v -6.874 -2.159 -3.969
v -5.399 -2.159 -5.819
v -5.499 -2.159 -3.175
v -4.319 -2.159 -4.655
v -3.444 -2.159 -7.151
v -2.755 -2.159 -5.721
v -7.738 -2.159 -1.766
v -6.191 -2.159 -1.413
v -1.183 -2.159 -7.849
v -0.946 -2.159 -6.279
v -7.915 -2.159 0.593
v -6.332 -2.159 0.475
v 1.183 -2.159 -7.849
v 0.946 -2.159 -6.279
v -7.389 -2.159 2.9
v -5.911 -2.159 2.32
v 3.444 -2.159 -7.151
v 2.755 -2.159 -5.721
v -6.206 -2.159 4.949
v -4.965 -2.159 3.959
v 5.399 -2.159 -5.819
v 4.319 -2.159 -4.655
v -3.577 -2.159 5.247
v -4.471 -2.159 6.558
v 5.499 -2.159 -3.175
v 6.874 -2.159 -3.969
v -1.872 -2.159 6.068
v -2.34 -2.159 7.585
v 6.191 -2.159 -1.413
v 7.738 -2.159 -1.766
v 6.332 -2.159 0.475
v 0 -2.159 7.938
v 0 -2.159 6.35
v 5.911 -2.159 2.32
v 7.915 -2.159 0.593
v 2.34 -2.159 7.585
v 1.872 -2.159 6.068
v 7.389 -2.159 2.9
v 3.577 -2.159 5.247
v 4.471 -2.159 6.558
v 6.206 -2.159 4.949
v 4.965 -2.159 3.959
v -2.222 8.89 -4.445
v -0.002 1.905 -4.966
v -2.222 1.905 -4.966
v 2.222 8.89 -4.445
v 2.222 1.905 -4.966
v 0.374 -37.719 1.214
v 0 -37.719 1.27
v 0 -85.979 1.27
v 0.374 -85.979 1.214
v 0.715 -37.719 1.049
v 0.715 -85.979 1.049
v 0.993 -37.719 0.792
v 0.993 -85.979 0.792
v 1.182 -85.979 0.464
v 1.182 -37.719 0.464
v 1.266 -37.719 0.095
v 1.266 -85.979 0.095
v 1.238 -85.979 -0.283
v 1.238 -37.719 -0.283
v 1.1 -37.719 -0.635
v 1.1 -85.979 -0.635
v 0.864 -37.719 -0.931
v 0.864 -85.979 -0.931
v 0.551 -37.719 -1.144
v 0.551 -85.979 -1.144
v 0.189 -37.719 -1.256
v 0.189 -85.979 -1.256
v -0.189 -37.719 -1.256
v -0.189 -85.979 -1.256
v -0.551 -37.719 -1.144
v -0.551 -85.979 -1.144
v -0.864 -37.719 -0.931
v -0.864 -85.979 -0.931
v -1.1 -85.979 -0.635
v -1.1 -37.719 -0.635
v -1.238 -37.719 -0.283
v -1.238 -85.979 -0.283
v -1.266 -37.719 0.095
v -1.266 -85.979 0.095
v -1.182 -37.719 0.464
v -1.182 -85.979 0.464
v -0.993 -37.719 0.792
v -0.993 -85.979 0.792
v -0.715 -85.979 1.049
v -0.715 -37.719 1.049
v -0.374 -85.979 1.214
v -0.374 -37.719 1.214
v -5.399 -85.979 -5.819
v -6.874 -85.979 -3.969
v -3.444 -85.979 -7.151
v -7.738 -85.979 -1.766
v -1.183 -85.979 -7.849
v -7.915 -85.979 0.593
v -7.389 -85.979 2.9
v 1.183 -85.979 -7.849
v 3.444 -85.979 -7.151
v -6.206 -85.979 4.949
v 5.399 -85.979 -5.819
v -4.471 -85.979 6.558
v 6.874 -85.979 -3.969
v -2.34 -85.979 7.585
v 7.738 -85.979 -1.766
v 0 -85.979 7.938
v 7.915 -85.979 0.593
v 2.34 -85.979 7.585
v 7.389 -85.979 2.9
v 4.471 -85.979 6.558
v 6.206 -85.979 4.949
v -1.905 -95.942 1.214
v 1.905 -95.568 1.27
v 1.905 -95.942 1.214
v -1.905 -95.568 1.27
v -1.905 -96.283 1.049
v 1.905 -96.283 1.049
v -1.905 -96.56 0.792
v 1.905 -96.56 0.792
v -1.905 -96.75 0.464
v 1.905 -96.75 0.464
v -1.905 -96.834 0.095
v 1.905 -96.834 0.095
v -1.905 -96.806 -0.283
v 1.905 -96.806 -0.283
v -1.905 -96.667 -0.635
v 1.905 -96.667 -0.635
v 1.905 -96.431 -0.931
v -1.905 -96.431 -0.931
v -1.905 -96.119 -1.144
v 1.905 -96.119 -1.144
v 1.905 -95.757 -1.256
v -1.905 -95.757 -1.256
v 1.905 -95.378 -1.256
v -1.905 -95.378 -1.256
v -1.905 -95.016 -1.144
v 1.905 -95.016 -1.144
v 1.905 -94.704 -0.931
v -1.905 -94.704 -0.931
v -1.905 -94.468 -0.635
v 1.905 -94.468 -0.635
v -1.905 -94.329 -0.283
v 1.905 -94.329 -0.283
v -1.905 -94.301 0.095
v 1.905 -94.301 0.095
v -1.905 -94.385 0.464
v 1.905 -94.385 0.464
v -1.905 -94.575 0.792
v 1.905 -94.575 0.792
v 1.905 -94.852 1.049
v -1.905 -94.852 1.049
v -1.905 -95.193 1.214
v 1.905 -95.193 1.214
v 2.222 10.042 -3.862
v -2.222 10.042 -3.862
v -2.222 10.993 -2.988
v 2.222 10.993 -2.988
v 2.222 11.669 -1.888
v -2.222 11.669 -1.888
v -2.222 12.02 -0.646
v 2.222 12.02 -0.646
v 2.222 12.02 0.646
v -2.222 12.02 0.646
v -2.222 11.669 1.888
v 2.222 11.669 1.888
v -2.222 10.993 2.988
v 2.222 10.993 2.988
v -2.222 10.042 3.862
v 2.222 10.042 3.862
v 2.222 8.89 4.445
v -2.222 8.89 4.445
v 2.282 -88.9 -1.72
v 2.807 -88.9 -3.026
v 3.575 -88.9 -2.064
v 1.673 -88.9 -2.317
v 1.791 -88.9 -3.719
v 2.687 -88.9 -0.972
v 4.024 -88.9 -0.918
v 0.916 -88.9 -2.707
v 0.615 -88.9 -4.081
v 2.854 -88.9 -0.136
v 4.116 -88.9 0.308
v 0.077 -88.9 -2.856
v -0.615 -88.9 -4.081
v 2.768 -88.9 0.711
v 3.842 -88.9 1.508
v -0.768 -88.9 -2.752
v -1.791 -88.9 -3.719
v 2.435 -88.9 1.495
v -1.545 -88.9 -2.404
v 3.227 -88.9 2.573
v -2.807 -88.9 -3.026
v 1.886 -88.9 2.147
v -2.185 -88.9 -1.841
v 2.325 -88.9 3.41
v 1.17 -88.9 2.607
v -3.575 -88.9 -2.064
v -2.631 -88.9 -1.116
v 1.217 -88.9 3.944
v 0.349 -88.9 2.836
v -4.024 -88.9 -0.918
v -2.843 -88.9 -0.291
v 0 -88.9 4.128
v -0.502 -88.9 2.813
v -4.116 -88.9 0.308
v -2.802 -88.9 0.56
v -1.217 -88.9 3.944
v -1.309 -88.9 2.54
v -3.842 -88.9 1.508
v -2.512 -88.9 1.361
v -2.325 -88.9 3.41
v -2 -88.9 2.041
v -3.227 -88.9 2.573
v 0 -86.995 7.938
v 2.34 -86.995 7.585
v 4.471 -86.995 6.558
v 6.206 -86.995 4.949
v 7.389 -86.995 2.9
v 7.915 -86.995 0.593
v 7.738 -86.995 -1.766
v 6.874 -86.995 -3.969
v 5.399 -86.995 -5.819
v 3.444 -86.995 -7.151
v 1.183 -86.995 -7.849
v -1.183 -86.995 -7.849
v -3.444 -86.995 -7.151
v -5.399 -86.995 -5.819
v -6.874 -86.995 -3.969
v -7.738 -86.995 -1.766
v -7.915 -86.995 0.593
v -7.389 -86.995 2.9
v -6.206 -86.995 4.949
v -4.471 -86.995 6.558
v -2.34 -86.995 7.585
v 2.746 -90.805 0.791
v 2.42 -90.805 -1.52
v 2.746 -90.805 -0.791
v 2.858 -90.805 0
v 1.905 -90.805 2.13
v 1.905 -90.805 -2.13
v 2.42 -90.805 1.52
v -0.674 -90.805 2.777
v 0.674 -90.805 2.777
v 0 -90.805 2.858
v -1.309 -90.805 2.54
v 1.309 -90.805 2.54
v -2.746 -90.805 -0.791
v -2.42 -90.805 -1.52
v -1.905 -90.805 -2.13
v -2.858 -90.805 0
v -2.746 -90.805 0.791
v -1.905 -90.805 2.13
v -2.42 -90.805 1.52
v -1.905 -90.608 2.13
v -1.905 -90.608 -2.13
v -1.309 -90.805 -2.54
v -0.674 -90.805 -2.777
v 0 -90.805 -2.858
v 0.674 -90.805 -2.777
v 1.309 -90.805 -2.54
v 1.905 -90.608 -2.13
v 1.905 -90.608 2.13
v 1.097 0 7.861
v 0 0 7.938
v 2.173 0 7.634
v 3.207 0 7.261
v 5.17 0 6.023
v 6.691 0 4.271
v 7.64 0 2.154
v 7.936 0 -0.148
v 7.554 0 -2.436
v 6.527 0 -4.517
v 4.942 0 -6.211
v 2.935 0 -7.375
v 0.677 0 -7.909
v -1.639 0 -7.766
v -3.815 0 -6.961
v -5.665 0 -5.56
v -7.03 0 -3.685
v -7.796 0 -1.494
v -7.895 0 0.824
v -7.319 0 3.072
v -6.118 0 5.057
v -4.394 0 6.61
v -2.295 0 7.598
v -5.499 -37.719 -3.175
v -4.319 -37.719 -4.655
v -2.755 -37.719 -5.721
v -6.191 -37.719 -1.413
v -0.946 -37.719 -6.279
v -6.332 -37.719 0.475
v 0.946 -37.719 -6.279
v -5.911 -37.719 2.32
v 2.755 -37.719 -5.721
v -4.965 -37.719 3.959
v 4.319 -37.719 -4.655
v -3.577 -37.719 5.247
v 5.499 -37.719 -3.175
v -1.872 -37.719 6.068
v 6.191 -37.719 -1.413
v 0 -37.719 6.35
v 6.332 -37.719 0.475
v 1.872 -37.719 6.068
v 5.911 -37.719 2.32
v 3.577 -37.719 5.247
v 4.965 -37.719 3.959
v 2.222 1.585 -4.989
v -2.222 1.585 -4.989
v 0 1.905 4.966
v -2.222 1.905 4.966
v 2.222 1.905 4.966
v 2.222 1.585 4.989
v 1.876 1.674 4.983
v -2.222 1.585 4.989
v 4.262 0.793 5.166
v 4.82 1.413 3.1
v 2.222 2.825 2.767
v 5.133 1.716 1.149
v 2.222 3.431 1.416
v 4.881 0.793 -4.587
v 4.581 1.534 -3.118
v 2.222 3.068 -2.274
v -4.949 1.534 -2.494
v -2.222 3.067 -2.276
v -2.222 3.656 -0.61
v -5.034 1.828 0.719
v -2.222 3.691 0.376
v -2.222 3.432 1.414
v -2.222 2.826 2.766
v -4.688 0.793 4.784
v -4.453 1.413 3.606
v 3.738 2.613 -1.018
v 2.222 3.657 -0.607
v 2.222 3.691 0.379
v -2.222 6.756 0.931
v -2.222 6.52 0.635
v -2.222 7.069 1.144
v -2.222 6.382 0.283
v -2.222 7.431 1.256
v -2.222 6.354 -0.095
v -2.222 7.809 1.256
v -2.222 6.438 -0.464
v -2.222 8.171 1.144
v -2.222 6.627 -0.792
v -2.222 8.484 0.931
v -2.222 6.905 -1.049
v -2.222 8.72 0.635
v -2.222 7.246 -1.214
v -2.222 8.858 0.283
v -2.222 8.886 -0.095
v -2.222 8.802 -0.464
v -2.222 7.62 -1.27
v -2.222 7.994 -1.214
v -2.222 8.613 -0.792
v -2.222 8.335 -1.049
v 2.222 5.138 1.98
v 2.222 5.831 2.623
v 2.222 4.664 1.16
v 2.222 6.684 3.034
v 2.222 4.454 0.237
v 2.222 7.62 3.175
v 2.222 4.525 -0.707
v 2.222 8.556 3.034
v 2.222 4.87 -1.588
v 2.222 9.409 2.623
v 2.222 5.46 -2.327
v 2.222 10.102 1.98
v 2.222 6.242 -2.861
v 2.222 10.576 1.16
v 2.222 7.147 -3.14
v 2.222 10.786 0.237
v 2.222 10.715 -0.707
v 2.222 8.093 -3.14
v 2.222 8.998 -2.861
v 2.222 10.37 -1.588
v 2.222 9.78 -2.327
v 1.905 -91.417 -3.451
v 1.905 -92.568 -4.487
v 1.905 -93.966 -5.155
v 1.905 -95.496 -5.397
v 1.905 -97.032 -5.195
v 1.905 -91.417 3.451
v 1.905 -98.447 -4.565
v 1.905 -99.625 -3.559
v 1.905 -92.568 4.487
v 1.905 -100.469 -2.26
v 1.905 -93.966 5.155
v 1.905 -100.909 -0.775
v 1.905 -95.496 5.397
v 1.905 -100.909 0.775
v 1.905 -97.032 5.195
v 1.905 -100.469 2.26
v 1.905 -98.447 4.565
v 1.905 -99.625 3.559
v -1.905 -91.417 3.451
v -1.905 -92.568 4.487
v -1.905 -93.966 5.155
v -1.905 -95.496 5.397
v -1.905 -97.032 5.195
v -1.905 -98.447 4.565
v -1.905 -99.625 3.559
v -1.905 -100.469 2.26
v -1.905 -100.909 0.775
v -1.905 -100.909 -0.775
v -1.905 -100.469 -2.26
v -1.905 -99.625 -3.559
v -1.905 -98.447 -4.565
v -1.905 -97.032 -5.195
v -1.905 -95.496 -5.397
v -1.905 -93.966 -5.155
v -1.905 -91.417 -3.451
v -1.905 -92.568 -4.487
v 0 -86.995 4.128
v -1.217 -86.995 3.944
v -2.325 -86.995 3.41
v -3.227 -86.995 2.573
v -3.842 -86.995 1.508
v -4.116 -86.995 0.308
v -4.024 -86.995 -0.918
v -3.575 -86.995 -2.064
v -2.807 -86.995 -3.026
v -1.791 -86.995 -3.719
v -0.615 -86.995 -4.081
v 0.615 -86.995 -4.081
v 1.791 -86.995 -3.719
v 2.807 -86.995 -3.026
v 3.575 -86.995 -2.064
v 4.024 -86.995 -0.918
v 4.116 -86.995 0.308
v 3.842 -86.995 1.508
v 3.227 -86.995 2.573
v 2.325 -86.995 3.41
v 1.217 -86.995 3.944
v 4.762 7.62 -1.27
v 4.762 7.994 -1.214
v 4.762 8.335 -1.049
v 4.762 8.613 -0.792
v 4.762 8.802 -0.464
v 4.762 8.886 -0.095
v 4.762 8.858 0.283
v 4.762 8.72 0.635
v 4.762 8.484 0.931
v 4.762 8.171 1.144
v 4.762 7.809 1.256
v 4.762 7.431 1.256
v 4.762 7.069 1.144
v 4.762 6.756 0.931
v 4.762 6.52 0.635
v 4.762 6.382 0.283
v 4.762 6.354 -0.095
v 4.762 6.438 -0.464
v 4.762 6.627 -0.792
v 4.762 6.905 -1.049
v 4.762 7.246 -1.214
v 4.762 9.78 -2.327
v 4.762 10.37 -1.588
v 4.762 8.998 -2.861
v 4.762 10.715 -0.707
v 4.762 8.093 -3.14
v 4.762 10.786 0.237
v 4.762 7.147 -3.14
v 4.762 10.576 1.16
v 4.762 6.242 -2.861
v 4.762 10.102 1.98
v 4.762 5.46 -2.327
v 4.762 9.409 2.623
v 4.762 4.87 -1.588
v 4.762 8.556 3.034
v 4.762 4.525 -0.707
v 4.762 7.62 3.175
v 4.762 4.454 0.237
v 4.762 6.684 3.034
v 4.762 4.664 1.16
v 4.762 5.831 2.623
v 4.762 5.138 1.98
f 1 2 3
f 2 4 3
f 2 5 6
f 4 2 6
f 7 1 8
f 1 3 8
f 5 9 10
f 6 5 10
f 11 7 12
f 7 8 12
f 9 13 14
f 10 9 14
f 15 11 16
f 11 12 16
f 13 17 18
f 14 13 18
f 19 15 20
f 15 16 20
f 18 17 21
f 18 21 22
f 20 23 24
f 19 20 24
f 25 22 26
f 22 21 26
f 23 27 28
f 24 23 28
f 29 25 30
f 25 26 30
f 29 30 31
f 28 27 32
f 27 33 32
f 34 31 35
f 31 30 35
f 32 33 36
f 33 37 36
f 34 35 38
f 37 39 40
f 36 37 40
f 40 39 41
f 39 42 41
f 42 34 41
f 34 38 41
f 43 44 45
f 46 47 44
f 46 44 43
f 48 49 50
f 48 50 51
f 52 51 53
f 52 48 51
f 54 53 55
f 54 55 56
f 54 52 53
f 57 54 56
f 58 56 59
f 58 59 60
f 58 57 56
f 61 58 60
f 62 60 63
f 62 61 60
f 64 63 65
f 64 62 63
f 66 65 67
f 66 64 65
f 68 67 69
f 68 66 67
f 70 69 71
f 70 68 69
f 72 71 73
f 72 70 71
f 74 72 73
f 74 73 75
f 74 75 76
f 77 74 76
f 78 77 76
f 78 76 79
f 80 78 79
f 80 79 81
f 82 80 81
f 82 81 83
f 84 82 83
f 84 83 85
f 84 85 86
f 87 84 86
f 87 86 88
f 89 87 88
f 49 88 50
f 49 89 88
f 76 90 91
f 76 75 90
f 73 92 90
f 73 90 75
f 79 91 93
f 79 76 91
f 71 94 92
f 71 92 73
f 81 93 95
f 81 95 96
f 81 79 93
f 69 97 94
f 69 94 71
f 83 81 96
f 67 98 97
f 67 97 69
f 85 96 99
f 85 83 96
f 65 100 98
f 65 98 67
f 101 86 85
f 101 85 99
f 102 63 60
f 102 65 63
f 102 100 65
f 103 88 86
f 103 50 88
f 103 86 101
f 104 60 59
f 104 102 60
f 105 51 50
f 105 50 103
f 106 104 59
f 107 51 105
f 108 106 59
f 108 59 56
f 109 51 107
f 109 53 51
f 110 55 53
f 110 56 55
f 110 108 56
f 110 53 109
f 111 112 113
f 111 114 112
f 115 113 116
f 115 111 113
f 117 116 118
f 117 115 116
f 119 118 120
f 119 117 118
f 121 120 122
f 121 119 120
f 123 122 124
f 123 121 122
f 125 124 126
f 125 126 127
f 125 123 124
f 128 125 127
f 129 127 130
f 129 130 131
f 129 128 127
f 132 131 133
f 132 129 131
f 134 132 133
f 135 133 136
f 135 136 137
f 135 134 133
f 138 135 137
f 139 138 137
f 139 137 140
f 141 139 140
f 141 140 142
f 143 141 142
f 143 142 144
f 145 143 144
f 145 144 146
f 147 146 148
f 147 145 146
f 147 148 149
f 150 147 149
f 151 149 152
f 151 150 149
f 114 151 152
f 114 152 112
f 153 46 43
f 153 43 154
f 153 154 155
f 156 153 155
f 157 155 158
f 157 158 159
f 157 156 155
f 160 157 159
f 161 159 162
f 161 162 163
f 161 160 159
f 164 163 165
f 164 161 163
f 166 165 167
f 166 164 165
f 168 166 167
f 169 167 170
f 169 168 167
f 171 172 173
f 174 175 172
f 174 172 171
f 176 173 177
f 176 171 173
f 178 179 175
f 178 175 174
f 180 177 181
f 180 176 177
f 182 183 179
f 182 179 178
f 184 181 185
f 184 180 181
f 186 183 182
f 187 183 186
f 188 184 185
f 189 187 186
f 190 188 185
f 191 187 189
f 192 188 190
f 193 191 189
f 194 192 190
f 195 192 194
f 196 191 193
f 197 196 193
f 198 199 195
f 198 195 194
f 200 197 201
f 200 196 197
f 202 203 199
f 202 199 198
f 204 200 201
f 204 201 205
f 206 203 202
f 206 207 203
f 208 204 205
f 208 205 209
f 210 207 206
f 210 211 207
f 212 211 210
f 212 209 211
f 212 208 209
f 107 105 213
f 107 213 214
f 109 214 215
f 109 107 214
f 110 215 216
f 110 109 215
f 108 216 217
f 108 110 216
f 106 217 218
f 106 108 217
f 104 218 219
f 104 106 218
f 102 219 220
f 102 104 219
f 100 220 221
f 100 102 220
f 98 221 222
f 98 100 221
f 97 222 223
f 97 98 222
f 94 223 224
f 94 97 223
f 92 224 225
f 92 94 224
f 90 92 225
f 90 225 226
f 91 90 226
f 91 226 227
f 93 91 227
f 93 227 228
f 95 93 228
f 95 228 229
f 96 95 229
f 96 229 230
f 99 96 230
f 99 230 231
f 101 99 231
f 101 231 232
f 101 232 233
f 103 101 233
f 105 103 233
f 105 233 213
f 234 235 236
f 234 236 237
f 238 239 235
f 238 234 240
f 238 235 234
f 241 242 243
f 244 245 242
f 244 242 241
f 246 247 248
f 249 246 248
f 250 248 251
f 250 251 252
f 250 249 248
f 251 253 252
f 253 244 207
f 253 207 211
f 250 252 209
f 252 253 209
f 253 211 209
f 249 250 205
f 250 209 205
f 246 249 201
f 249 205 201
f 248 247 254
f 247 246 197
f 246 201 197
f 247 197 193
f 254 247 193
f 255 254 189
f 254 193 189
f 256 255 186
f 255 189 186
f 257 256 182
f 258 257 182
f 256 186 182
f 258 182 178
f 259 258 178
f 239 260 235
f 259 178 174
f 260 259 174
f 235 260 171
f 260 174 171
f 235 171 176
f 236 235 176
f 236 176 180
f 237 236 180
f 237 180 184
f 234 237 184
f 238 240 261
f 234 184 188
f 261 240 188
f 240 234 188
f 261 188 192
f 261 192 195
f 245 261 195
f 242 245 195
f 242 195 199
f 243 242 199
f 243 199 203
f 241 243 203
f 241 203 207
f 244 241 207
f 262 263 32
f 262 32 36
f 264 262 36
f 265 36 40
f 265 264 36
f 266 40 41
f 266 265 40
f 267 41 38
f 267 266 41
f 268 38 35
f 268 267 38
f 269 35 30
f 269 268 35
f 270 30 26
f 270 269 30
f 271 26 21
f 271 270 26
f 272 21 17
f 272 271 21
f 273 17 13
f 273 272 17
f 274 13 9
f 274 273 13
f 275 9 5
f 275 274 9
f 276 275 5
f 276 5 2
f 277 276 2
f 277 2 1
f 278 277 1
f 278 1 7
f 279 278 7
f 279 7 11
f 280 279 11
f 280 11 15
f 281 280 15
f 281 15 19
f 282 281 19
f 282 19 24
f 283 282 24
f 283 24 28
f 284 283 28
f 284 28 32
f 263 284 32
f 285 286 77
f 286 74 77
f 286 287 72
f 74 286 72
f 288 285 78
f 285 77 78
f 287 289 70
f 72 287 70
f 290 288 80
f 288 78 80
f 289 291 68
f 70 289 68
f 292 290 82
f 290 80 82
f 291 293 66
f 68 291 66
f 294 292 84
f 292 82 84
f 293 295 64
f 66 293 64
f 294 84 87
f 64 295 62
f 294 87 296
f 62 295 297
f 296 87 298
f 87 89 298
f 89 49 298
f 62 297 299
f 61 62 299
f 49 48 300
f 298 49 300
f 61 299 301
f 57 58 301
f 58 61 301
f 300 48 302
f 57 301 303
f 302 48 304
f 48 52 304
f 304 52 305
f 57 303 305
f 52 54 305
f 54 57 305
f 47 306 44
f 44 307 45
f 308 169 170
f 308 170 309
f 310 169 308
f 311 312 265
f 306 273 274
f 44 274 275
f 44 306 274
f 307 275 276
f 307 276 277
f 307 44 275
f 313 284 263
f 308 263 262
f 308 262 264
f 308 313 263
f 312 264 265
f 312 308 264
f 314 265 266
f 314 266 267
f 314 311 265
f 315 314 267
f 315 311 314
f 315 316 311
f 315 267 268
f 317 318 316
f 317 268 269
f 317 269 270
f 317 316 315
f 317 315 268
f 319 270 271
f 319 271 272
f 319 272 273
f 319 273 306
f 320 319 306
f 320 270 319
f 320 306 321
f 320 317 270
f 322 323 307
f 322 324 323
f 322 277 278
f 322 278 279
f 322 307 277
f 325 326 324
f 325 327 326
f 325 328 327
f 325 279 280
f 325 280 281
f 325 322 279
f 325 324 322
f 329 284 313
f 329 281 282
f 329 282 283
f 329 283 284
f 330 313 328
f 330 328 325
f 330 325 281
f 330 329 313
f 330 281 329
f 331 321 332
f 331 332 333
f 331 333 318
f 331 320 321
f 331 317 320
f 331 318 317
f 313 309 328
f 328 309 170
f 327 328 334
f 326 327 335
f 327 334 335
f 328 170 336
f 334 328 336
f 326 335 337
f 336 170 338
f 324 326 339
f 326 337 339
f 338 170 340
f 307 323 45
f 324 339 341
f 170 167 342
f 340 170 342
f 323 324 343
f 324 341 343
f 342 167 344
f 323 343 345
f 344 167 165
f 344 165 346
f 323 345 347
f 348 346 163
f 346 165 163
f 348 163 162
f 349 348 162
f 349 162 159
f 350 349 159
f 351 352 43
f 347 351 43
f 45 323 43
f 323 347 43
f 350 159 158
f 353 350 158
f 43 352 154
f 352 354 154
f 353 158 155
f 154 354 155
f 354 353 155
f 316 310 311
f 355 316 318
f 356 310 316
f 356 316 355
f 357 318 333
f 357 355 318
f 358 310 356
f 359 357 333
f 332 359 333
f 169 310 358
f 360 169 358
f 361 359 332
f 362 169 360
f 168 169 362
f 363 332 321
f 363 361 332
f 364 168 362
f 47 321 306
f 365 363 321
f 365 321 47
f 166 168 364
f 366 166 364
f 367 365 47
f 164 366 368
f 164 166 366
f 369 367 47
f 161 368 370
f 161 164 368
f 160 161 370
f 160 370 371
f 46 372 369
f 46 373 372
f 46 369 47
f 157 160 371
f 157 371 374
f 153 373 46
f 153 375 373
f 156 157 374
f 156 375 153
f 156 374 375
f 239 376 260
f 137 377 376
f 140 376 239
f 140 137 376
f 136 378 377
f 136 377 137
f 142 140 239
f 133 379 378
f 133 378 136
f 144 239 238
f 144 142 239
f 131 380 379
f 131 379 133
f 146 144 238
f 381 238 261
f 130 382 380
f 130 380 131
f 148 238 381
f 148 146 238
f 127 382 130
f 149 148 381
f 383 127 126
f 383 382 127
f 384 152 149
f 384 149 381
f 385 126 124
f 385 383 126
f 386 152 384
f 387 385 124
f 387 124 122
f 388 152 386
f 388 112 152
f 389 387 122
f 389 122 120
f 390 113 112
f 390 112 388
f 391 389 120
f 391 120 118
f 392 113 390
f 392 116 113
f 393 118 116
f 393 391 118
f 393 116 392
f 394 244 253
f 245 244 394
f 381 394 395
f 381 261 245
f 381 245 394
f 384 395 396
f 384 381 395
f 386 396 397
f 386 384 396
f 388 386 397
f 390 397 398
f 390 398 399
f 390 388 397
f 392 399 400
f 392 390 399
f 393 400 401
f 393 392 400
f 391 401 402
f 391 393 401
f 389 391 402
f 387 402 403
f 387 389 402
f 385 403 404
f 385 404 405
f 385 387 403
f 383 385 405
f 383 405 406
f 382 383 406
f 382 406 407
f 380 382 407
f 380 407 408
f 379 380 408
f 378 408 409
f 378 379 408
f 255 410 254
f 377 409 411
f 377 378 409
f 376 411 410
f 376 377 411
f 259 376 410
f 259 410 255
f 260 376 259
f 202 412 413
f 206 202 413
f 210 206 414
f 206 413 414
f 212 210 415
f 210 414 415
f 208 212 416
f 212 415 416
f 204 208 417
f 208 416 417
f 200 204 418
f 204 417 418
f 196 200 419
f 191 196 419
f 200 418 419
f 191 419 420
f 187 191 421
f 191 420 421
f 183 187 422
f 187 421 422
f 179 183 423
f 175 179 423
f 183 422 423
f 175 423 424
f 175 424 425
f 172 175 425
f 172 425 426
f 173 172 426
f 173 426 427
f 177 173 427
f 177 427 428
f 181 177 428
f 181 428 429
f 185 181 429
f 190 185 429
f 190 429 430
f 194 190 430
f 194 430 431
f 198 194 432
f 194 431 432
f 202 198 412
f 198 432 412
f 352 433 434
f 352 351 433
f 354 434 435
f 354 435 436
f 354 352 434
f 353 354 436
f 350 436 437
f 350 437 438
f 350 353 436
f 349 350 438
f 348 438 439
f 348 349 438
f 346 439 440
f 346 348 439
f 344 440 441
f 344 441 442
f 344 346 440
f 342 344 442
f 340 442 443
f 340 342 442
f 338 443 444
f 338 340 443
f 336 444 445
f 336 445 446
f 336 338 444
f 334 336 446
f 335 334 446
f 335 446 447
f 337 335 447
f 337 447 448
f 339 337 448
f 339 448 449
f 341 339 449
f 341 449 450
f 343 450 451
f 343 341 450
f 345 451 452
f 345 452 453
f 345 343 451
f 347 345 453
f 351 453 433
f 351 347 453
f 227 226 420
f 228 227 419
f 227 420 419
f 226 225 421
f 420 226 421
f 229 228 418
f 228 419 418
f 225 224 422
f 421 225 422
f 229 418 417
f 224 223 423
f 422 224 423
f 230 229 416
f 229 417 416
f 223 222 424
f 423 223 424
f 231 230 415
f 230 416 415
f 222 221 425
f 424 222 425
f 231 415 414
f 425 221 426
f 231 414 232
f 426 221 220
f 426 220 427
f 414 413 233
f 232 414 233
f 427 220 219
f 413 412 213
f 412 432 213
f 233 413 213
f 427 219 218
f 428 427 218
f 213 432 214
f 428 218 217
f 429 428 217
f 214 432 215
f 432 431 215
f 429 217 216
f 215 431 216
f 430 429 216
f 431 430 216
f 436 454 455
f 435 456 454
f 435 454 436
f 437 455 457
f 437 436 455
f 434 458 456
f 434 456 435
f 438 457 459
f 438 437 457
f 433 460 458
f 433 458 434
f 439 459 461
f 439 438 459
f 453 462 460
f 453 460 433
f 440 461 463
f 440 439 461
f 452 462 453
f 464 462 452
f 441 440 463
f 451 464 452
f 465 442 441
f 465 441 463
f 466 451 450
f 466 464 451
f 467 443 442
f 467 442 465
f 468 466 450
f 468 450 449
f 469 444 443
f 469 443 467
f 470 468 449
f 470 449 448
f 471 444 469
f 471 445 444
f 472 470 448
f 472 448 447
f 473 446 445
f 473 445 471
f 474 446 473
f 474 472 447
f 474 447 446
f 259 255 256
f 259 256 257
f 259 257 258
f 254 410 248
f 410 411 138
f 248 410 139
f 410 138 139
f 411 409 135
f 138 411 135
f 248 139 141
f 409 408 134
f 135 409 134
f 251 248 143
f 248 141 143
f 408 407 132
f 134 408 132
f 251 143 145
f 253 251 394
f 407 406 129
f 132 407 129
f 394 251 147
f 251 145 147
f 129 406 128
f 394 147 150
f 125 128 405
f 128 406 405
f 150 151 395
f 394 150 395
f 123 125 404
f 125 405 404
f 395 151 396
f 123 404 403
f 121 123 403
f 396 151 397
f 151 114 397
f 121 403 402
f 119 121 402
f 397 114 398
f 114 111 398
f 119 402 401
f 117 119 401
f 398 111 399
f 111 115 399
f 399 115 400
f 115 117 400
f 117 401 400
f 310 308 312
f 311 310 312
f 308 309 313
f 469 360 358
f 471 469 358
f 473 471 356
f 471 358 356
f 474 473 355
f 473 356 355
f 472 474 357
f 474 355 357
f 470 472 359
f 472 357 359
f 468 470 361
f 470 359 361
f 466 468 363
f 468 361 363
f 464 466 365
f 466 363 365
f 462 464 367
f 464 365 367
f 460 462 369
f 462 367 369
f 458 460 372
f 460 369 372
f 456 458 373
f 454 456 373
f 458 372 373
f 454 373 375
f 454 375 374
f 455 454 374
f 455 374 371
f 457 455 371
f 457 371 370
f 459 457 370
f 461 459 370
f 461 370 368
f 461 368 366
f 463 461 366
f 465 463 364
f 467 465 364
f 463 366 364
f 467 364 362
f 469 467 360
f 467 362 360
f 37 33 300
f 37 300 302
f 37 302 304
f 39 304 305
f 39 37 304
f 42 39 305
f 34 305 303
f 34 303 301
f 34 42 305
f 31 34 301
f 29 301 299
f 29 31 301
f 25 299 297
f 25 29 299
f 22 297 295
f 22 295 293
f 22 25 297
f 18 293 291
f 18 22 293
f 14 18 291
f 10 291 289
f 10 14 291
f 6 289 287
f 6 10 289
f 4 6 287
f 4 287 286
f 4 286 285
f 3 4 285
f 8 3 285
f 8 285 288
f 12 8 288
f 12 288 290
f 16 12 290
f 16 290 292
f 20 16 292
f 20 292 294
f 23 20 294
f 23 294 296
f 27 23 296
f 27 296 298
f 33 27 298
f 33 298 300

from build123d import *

# Parameters (mm, degrees)
SKETCH1_R          = 7.9375
EXTRUDE1_DEPTH     = 86.995
SKETCH4_R          = 1.27
EXTRUDE2_DEPTH     = 2.2225
SKETCH5_R          = 5.3975
SKETCH5_R_2        = 1.27
EXTRUDE3_DEPTH     = 1.905
SKETCH6_R          = 4.1275
EXTRUDE4_DEPTH     = 1.905
SKETCH7_R          = 2.8575
EXTRUDE5_DEPTH     = 1.905
SKETCH8_R          = 3.175
SKETCH8_R_2        = 1.27
EXTRUDE6_DEPTH     = 2.54
SKETCH10_R         = 7.9375
SKETCH10_R_2       = 6.35
CUT_EXTRUDE2_DEPTH = 38.1
SKETCH11_R         = 7.9375
SKETCH11_R_2       = 1.27
CUT_EXTRUDE3_DEPTH = 48.26


with BuildPart() as part:
    # Sketch1 → Extrude1 (new body)
    with BuildSketch(Plane(origin=(0, 0, 0), x_dir=(1, 0, 0), z_dir=(0, 1, 0))):
        with Locations(Location((0, 0, 0), (0, 0, 270))):
            Circle(SKETCH1_R)
    extrude(amount=-EXTRUDE1_DEPTH)

    # Loft1: read off the stored shape, not the designer's step
    # Loft1: loft between two sections, ruled curve by curve
    loft1_from = [
        Edge.make_bspline([(3.207196431, 0, 7.26070226), (17.72860095, 0, 0.846309398), (11.314208088, 0, -13.675095122), (-3.207196431, 0, -7.26070226), (-17.72860095, 0, -0.846309398), (-11.314208088, 0, 13.675095122), (3.207196431, 0, 7.26070226)], [0, 0, 0, 0, 0.5, 0.5, 0.5, 1, 1, 1, 1], 3, [1, 0.333333333, 0.333333333, 1, 0.333333333, 0.333333333, 1]),
    ]
    loft1_to = [
        Edge.make_bspline([(0.075387957, 3.937, 1.903507724), (3.882403406, 3.937, 1.75273181), (3.731627491, 3.937, -2.054283639), (-0.075387957, 3.937, -1.903507724), (-3.882403406, 3.937, -1.75273181), (-3.731627491, 3.937, 2.054283639), (0.075387957, 3.937, 1.903507724)], [0, 0, 0, 0, 0.5, 0.5, 0.5, 1, 1, 1, 1], 3, [1, 0.333333333, 0.333333333, 1, 0.333333333, 0.333333333, 1]),
    ]
    loft1 = Solid(Shell([*[Face.make_surface_from_curves(loft1_from[k], loft1_to[k]) for k in range(1)], Face(Wire(loft1_from)), Face(Wire(loft1_to))]))
    add(loft1)

    # Sketch4 → Extrude2 (add, symmetric)
    with BuildSketch(Plane(origin=(0, 0, 0), x_dir=(0, 0, -1), z_dir=(1, 0, 0))):
        with BuildLine():
            Line((4.965601833, 1.905), (4.445, 8.89))
            ThreePointArc((4.445, 8.89), (0, 12.065), (-4.445, 8.89))
            Line((-4.445, 8.89), (-4.965601949, 1.905))
            Line((-4.965601949, 1.905), (-5.107584298, 0))
            Line((-5.107584298, 0), (5.107584151, 0))
            Line((5.107584151, 0), (4.965601833, 1.905))
        make_face()
        with Locations((0, 7.62)):
            Circle(SKETCH4_R, mode=Mode.SUBTRACT)
    extrude(amount=EXTRUDE2_DEPTH, both=True)

    # Sketch6 → Extrude4 (add)
    with BuildSketch(Plane.XZ.offset(86.995)):
        with Locations(Location((0, 0, 0), (0, 0, 90))):
            Circle(SKETCH6_R)
    extrude(amount=EXTRUDE4_DEPTH)



with BuildPart() as body_2:
    # Sketch5 → Extrude3 (new, symmetric)
    with BuildSketch(Plane(origin=(0, 0, 0), x_dir=(0, 0, -1), z_dir=(1, 0, 0))):
        with Locations(Location((0, -95.5675, 0), (0, 0, 180))):
            Circle(SKETCH5_R)
        with Locations(Location((0, -95.5675, 0), (0, 0, 180))):
            Circle(SKETCH5_R_2, mode=Mode.SUBTRACT)
    extrude(amount=EXTRUDE3_DEPTH, both=True)


with BuildPart() as part_1:
    add(part.part)

    add(body_2.part)  # Extrude5 merges body 2
    # Sketch7 → Extrude5 (add)
    with BuildSketch(Plane.XZ.offset(88.9)):
        with Locations(Location((0, 0, 0), (0, 0, 117.266044451))):
            Circle(SKETCH7_R)
    extrude(amount=EXTRUDE5_DEPTH)

    # Sketch8 → Extrude6 (add)
    with BuildSketch(Plane(origin=(2.2225, 0, 0), x_dir=(0, 0, -1), z_dir=(1, 0, 0))):
        with Locations(Location((0, 7.62, 0), (0, 0, 180))):
            Circle(SKETCH8_R)
        with Locations((0, 7.62)):
            Circle(SKETCH8_R_2, mode=Mode.SUBTRACT)
    extrude(amount=EXTRUDE6_DEPTH)

    # Sketch10 → Cut-Extrude2 (cut)
    with BuildSketch(Plane(origin=(0, -2.159, 0), x_dir=(-1, 0, 0), z_dir=(0, 1, 0))):
        with Locations(Location((0, 0, 0), (0, 0, 90))):
            Circle(SKETCH10_R)
        with Locations(Location((0, 0, 0), (0, 0, 90))):
            Circle(SKETCH10_R_2, mode=Mode.SUBTRACT)
    extrude(amount=-CUT_EXTRUDE2_DEPTH, mode=Mode.SUBTRACT)

    # Sketch11 → Cut-Extrude3 (cut)
    with BuildSketch(Plane(origin=(0, -37.719, 0), x_dir=(-1, 0, 0), z_dir=(0, 1, 0))):
        with Locations(Location((0, 0, 0), (0, 0, 90))):
            Circle(SKETCH11_R)
        with Locations(Location((0, 0, 0), (0, 0, 90))):
            Circle(SKETCH11_R_2, mode=Mode.SUBTRACT)
    extrude(amount=-CUT_EXTRUDE3_DEPTH, mode=Mode.SUBTRACT)


solid = part_1.part
